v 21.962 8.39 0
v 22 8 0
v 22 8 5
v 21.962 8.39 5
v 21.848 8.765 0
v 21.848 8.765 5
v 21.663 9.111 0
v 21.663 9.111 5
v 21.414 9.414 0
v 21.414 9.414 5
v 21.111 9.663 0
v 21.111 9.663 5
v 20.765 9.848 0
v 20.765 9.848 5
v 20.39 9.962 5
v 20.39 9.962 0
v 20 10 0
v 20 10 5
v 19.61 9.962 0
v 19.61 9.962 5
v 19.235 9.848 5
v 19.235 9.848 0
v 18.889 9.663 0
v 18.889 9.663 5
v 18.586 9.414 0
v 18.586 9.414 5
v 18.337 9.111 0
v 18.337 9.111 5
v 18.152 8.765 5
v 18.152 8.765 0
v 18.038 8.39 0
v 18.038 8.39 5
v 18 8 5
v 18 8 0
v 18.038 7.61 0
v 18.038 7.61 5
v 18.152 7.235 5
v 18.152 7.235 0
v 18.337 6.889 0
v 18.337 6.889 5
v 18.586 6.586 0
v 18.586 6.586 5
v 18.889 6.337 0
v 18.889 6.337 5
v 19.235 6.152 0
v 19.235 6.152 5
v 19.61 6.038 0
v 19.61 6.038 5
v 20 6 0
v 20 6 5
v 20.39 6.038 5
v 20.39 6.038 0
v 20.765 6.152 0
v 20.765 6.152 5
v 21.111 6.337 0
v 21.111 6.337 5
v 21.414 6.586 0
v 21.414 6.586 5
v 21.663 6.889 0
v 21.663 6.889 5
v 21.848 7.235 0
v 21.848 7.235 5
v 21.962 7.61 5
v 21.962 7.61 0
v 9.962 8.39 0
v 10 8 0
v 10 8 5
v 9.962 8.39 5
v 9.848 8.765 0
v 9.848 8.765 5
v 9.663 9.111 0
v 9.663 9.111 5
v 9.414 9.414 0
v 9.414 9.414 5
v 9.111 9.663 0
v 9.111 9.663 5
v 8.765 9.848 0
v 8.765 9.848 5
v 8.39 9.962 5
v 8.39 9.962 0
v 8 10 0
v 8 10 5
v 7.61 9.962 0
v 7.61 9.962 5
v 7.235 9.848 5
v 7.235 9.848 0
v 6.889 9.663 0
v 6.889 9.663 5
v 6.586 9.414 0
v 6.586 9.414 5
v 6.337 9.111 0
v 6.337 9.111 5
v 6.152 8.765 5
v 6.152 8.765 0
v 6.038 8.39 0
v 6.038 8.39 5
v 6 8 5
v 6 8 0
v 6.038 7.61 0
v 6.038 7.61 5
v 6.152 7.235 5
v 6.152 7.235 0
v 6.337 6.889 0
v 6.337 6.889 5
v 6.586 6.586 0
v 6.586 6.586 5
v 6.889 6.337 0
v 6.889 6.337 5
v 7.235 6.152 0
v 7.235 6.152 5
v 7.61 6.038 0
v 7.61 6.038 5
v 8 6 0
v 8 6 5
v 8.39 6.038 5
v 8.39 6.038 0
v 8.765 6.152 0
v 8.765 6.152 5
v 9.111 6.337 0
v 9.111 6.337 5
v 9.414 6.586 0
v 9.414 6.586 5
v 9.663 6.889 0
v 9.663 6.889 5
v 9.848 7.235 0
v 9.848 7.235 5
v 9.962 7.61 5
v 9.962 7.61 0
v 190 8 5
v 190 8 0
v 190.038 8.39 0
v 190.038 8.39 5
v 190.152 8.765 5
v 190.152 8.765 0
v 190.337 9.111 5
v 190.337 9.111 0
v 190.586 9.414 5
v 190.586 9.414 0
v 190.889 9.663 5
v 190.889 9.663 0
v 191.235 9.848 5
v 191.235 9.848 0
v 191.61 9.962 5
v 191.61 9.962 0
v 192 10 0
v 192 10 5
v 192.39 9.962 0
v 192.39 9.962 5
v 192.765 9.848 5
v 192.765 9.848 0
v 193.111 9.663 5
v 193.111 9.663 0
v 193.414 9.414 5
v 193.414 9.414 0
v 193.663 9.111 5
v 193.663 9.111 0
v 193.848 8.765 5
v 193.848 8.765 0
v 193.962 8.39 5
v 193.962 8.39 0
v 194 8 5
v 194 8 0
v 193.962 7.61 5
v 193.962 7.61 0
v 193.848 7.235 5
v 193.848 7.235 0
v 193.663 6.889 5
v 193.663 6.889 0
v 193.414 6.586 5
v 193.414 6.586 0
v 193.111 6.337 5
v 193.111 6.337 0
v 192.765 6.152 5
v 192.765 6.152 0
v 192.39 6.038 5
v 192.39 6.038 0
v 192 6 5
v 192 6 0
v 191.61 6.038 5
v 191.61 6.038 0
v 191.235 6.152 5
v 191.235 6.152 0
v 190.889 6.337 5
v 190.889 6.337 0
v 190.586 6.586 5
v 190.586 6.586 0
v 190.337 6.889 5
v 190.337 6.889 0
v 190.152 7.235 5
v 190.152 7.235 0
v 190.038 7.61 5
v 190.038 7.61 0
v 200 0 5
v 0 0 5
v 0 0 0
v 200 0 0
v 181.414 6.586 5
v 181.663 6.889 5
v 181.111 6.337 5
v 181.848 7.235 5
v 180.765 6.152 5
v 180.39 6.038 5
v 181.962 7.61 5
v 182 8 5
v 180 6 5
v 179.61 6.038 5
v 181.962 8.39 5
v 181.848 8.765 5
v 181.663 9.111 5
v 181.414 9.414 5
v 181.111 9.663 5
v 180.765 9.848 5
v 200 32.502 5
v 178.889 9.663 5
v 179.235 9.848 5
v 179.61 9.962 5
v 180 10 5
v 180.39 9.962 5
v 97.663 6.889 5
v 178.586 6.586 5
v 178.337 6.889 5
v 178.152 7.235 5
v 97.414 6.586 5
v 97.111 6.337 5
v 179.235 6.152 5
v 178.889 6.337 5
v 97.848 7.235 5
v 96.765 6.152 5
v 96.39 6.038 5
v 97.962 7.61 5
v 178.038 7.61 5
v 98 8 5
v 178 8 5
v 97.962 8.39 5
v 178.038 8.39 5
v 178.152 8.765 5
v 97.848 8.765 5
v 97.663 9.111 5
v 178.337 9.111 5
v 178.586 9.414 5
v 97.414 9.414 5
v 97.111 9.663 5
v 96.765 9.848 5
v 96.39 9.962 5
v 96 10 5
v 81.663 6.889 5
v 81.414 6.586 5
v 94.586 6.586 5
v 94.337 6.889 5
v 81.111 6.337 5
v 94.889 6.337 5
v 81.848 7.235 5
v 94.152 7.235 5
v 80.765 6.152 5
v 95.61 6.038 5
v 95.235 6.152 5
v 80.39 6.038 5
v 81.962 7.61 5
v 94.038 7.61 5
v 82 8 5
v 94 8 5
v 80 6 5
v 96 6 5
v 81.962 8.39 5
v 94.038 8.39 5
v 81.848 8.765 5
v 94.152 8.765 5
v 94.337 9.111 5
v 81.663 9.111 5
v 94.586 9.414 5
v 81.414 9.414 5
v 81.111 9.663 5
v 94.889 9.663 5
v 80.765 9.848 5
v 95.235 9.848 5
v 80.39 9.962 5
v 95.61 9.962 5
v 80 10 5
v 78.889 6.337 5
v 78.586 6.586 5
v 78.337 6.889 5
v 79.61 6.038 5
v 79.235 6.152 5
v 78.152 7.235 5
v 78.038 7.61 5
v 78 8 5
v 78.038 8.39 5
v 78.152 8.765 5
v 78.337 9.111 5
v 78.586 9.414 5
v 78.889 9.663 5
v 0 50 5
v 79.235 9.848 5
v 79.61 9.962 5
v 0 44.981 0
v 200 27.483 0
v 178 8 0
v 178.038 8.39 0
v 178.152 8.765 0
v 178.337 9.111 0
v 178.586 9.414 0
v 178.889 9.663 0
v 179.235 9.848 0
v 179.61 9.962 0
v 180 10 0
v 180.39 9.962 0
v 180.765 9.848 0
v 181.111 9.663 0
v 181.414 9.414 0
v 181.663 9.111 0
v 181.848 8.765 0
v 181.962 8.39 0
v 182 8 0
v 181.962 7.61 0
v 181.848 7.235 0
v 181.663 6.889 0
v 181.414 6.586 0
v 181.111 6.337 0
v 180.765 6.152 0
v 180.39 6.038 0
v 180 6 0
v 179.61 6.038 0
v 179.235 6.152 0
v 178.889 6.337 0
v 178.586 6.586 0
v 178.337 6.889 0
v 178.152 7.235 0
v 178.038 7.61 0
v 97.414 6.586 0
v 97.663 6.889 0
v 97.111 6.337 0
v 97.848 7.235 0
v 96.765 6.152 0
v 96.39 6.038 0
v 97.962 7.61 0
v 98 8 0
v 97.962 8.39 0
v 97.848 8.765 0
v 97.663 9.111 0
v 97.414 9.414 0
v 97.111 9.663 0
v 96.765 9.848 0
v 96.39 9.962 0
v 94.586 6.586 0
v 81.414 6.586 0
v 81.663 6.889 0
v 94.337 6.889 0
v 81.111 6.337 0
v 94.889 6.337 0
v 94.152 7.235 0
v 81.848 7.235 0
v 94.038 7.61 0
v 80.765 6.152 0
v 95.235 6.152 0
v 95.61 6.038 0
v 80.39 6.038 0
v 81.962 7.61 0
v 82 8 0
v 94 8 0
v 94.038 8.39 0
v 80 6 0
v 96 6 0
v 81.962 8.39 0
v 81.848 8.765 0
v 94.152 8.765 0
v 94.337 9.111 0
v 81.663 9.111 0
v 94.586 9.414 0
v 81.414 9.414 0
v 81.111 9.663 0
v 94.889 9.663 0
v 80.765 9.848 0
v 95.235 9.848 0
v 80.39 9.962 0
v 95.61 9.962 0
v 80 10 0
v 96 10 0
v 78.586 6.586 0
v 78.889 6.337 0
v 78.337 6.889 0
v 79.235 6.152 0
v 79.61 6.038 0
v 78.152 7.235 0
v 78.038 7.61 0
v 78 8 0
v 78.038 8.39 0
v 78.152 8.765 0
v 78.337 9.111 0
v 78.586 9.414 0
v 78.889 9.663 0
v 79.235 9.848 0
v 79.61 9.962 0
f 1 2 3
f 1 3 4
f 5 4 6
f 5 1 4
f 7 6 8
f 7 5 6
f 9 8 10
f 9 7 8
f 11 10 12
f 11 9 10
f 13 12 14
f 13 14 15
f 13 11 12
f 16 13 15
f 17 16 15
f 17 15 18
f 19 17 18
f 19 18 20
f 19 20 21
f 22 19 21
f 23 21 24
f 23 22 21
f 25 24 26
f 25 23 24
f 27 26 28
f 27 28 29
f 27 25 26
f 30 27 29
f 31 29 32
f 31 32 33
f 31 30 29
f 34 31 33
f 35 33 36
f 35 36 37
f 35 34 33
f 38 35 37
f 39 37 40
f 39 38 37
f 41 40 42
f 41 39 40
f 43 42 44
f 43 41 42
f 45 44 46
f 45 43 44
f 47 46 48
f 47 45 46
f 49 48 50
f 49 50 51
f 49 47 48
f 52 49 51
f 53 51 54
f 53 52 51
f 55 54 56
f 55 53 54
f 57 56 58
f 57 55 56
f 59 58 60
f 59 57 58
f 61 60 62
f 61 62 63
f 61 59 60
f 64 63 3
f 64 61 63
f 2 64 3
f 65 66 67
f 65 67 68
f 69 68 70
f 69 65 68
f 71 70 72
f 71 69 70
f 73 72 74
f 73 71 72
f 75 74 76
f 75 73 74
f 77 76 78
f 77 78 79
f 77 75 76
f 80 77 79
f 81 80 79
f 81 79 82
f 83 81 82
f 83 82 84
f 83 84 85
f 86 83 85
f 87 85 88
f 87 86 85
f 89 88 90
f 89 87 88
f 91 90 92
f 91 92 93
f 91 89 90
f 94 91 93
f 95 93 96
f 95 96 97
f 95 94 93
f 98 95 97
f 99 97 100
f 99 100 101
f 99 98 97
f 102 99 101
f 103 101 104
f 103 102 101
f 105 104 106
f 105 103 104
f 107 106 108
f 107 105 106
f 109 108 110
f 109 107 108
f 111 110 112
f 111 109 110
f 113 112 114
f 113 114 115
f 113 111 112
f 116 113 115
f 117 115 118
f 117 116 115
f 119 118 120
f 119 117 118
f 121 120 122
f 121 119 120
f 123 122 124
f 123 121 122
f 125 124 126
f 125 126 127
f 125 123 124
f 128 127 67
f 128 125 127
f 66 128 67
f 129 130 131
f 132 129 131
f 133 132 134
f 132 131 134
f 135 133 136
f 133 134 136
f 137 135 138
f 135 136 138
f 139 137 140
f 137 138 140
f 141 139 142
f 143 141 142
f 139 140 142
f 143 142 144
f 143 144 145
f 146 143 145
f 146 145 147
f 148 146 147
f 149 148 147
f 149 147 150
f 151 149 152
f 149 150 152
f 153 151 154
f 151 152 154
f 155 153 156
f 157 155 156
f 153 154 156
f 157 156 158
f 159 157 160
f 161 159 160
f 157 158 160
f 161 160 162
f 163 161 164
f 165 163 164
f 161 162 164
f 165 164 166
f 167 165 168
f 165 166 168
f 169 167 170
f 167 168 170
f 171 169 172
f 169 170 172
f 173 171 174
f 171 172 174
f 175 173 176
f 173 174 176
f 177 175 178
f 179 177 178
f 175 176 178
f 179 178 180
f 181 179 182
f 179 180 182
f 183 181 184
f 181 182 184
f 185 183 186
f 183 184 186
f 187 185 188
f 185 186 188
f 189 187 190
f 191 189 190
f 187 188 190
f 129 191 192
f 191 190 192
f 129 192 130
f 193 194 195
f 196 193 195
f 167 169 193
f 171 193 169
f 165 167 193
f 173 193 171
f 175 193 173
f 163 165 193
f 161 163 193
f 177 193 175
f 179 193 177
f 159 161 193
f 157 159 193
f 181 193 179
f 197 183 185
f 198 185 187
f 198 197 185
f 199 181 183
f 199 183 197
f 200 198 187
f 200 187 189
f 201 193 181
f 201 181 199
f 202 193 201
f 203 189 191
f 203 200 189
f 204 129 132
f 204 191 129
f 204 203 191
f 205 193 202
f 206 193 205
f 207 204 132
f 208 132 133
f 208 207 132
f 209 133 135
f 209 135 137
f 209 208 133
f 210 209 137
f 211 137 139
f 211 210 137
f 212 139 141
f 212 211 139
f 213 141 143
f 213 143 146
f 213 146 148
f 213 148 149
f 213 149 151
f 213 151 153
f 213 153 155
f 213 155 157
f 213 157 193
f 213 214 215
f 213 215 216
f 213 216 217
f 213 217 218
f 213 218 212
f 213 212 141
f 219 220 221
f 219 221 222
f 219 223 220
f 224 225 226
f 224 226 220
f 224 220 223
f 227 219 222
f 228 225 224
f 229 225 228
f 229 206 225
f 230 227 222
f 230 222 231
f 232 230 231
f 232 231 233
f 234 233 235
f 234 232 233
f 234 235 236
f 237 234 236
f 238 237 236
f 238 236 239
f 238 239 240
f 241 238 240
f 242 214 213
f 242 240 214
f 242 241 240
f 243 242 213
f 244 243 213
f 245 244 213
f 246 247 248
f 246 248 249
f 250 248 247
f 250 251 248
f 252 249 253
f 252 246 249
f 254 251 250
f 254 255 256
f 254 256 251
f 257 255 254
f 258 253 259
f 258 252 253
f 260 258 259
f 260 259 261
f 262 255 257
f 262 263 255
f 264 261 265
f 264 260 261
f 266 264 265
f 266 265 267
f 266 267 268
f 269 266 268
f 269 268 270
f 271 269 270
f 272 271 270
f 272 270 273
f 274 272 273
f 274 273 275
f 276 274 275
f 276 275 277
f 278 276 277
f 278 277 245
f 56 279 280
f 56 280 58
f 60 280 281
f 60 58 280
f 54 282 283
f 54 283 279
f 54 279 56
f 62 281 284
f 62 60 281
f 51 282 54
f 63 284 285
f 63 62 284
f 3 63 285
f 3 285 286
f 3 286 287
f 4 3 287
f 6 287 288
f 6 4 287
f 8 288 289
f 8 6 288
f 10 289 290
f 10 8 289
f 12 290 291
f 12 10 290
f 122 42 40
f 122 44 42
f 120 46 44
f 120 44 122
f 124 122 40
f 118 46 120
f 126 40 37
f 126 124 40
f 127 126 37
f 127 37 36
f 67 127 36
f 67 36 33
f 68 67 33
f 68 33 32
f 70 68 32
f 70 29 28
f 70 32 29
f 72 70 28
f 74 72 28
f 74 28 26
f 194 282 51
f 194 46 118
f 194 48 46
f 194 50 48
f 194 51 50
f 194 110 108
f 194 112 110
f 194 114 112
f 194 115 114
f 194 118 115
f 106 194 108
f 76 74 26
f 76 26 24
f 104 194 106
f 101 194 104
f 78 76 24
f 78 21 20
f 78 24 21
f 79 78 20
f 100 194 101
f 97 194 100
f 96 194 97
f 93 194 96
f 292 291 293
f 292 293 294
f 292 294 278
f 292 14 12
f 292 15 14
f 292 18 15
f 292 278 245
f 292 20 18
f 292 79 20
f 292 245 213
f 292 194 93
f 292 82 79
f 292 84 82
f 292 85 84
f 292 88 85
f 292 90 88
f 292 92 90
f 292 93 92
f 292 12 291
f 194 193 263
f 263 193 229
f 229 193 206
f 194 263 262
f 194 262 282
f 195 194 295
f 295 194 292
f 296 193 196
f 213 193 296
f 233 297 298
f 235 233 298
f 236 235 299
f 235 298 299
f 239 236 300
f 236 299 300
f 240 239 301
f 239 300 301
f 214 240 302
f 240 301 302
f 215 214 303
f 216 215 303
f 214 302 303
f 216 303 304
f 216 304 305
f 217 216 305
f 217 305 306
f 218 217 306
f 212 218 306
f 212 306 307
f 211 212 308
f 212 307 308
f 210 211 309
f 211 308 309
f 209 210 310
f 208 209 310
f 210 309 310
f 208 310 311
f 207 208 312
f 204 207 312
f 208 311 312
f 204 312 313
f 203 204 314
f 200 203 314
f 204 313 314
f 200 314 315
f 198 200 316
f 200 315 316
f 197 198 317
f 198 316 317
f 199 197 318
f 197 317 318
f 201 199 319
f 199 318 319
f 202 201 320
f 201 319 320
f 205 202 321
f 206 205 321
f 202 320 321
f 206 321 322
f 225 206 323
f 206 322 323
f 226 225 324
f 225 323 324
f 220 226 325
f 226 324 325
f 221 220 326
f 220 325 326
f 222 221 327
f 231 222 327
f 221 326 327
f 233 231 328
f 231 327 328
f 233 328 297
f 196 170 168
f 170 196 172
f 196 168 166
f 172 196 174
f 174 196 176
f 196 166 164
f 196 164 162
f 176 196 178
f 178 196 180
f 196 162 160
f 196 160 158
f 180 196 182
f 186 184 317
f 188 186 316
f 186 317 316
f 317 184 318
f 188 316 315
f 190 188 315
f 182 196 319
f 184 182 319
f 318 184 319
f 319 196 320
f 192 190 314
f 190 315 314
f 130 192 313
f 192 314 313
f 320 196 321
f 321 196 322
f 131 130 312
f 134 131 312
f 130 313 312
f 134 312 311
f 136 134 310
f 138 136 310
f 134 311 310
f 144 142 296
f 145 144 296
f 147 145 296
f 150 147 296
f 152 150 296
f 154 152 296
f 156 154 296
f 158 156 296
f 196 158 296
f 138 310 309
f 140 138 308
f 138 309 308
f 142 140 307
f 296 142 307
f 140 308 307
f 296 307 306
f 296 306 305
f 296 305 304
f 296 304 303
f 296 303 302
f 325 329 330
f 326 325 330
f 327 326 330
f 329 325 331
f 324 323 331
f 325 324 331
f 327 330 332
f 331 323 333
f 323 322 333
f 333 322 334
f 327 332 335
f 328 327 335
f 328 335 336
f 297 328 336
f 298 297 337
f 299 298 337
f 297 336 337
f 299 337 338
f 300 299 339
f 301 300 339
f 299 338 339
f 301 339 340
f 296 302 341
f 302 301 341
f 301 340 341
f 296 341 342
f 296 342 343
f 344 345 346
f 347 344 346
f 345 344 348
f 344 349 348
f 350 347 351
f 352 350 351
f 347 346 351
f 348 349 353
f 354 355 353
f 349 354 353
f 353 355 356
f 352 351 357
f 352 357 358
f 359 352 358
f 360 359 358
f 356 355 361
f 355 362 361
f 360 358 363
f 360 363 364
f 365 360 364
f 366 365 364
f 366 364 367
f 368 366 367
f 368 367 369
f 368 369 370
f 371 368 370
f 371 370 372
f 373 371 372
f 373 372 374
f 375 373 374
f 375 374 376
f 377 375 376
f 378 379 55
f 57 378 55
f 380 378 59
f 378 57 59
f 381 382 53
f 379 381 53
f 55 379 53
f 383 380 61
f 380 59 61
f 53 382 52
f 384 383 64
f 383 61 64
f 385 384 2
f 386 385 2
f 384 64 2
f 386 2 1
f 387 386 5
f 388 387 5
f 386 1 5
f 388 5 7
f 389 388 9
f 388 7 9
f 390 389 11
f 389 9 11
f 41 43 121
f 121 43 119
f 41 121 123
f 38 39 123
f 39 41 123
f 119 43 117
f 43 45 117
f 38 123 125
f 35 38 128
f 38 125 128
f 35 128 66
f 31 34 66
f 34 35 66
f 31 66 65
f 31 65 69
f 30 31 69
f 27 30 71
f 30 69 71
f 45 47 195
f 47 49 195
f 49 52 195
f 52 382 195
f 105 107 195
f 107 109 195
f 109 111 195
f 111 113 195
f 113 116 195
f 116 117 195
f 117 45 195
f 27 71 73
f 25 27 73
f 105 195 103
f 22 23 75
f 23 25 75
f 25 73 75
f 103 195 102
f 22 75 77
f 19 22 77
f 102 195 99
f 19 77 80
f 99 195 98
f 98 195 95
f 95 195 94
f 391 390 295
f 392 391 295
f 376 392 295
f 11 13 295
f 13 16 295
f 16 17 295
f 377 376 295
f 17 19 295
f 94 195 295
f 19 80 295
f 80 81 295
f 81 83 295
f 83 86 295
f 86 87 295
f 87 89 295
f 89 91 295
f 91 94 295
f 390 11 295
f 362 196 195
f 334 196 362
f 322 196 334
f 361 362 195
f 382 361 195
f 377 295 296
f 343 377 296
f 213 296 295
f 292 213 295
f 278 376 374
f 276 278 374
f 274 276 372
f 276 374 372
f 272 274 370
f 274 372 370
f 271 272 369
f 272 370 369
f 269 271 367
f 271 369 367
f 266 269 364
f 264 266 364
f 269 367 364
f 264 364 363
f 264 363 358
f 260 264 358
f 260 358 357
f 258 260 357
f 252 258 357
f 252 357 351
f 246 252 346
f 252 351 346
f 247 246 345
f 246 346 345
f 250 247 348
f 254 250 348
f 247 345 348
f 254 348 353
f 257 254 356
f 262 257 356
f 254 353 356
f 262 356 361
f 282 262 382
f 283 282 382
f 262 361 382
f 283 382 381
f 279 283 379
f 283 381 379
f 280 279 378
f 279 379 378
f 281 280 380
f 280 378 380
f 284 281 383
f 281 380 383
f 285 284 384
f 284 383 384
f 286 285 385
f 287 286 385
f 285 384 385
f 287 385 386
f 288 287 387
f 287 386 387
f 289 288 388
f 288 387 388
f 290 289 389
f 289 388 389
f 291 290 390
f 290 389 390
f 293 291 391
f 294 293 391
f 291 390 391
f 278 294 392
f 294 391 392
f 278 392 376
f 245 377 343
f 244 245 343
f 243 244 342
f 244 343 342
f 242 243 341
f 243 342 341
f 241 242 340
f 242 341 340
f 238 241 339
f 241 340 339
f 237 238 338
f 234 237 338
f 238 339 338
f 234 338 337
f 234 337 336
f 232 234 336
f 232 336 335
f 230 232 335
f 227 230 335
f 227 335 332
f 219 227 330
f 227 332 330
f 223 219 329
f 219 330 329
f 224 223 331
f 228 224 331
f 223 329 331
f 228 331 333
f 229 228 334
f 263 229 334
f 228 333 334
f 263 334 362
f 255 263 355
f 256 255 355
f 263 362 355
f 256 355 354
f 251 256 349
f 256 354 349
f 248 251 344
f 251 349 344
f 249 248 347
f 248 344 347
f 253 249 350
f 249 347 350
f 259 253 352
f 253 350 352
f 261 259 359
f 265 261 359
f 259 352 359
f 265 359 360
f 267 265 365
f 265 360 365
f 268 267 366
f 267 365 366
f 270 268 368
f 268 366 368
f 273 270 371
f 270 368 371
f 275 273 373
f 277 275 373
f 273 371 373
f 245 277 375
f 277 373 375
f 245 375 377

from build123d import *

# Parameters (mm, degrees)
SKETCH1_W           = 5
SKETCH1_H           = 50
BOSS_EXTRUDE1_DEPTH = 200
CUT_EXTRUDE2_DEPTH  = 5
CHAMFER1_SIZE       = 5
SKETCH2_R           = 2
CUT_EXTRUDE1_DEPTH  = 5
SKETCH4_R           = 2
CUT_EXTRUDE3_DEPTH  = 5


with BuildPart() as part:
    # Sketch1 → Boss-Extrude1 (new body)
    with BuildSketch(Plane(origin=(0, 0, 0), x_dir=(0, 0, -1), z_dir=(1, 0, 0))):
        with Locations((-2.5, 25)):
            Rectangle(SKETCH1_W, SKETCH1_H)
    extrude(amount=BOSS_EXTRUDE1_DEPTH)

    # Sketch3 → Cut-Extrude2 (cut)
    with BuildSketch(Plane.XY.offset(5)):
        Polygon((0, 50), (200, 50), (200, 32.502267295), align=None)
    extrude(amount=-CUT_EXTRUDE2_DEPTH, mode=Mode.SUBTRACT)

    # Chamfer1
    chamfer1_edges = [part.edges().sort_by_distance(p)[0] for p in [
        (100, 41.251133647, 0),
    ]]
    chamfer(chamfer1_edges, length=CHAMFER1_SIZE - 0.0001)  # a hair under: the kernel refuses the full size

    # Sketch2 → Cut-Extrude1 (cut)
    with BuildSketch(Plane(origin=(0, 0, 0), x_dir=(-1, 0, 0), z_dir=(0, 0, -1))):
        with Locations((-192, 8)):
            Circle(SKETCH2_R)
        with Locations((-180, 8)):
            Circle(SKETCH2_R)
    cut_extrude1 = extrude(amount=-CUT_EXTRUDE1_DEPTH, mode=Mode.SUBTRACT)

    # Mirror2: Cut-Extrude1 across plane
    add(cut_extrude1.mirror(Plane(origin=(100, 0, 0), x_dir=(0, 0, 1), z_dir=(1, 0, 0))), mode=Mode.SUBTRACT)

    # Sketch4 → Cut-Extrude3 (cut)
    with BuildSketch(Plane(origin=(0, 0, 0), x_dir=(-1, 0, 0), z_dir=(0, 0, -1))):
        with Locations(Location((-80, 8, 0), (0, 0, 90))):
            Circle(SKETCH4_R)
        with Locations(Location((-96, 8, 0), (0, 0, 90))):
            Circle(SKETCH4_R)
    extrude(amount=-CUT_EXTRUDE3_DEPTH, mode=Mode.SUBTRACT)


solid = part.part
